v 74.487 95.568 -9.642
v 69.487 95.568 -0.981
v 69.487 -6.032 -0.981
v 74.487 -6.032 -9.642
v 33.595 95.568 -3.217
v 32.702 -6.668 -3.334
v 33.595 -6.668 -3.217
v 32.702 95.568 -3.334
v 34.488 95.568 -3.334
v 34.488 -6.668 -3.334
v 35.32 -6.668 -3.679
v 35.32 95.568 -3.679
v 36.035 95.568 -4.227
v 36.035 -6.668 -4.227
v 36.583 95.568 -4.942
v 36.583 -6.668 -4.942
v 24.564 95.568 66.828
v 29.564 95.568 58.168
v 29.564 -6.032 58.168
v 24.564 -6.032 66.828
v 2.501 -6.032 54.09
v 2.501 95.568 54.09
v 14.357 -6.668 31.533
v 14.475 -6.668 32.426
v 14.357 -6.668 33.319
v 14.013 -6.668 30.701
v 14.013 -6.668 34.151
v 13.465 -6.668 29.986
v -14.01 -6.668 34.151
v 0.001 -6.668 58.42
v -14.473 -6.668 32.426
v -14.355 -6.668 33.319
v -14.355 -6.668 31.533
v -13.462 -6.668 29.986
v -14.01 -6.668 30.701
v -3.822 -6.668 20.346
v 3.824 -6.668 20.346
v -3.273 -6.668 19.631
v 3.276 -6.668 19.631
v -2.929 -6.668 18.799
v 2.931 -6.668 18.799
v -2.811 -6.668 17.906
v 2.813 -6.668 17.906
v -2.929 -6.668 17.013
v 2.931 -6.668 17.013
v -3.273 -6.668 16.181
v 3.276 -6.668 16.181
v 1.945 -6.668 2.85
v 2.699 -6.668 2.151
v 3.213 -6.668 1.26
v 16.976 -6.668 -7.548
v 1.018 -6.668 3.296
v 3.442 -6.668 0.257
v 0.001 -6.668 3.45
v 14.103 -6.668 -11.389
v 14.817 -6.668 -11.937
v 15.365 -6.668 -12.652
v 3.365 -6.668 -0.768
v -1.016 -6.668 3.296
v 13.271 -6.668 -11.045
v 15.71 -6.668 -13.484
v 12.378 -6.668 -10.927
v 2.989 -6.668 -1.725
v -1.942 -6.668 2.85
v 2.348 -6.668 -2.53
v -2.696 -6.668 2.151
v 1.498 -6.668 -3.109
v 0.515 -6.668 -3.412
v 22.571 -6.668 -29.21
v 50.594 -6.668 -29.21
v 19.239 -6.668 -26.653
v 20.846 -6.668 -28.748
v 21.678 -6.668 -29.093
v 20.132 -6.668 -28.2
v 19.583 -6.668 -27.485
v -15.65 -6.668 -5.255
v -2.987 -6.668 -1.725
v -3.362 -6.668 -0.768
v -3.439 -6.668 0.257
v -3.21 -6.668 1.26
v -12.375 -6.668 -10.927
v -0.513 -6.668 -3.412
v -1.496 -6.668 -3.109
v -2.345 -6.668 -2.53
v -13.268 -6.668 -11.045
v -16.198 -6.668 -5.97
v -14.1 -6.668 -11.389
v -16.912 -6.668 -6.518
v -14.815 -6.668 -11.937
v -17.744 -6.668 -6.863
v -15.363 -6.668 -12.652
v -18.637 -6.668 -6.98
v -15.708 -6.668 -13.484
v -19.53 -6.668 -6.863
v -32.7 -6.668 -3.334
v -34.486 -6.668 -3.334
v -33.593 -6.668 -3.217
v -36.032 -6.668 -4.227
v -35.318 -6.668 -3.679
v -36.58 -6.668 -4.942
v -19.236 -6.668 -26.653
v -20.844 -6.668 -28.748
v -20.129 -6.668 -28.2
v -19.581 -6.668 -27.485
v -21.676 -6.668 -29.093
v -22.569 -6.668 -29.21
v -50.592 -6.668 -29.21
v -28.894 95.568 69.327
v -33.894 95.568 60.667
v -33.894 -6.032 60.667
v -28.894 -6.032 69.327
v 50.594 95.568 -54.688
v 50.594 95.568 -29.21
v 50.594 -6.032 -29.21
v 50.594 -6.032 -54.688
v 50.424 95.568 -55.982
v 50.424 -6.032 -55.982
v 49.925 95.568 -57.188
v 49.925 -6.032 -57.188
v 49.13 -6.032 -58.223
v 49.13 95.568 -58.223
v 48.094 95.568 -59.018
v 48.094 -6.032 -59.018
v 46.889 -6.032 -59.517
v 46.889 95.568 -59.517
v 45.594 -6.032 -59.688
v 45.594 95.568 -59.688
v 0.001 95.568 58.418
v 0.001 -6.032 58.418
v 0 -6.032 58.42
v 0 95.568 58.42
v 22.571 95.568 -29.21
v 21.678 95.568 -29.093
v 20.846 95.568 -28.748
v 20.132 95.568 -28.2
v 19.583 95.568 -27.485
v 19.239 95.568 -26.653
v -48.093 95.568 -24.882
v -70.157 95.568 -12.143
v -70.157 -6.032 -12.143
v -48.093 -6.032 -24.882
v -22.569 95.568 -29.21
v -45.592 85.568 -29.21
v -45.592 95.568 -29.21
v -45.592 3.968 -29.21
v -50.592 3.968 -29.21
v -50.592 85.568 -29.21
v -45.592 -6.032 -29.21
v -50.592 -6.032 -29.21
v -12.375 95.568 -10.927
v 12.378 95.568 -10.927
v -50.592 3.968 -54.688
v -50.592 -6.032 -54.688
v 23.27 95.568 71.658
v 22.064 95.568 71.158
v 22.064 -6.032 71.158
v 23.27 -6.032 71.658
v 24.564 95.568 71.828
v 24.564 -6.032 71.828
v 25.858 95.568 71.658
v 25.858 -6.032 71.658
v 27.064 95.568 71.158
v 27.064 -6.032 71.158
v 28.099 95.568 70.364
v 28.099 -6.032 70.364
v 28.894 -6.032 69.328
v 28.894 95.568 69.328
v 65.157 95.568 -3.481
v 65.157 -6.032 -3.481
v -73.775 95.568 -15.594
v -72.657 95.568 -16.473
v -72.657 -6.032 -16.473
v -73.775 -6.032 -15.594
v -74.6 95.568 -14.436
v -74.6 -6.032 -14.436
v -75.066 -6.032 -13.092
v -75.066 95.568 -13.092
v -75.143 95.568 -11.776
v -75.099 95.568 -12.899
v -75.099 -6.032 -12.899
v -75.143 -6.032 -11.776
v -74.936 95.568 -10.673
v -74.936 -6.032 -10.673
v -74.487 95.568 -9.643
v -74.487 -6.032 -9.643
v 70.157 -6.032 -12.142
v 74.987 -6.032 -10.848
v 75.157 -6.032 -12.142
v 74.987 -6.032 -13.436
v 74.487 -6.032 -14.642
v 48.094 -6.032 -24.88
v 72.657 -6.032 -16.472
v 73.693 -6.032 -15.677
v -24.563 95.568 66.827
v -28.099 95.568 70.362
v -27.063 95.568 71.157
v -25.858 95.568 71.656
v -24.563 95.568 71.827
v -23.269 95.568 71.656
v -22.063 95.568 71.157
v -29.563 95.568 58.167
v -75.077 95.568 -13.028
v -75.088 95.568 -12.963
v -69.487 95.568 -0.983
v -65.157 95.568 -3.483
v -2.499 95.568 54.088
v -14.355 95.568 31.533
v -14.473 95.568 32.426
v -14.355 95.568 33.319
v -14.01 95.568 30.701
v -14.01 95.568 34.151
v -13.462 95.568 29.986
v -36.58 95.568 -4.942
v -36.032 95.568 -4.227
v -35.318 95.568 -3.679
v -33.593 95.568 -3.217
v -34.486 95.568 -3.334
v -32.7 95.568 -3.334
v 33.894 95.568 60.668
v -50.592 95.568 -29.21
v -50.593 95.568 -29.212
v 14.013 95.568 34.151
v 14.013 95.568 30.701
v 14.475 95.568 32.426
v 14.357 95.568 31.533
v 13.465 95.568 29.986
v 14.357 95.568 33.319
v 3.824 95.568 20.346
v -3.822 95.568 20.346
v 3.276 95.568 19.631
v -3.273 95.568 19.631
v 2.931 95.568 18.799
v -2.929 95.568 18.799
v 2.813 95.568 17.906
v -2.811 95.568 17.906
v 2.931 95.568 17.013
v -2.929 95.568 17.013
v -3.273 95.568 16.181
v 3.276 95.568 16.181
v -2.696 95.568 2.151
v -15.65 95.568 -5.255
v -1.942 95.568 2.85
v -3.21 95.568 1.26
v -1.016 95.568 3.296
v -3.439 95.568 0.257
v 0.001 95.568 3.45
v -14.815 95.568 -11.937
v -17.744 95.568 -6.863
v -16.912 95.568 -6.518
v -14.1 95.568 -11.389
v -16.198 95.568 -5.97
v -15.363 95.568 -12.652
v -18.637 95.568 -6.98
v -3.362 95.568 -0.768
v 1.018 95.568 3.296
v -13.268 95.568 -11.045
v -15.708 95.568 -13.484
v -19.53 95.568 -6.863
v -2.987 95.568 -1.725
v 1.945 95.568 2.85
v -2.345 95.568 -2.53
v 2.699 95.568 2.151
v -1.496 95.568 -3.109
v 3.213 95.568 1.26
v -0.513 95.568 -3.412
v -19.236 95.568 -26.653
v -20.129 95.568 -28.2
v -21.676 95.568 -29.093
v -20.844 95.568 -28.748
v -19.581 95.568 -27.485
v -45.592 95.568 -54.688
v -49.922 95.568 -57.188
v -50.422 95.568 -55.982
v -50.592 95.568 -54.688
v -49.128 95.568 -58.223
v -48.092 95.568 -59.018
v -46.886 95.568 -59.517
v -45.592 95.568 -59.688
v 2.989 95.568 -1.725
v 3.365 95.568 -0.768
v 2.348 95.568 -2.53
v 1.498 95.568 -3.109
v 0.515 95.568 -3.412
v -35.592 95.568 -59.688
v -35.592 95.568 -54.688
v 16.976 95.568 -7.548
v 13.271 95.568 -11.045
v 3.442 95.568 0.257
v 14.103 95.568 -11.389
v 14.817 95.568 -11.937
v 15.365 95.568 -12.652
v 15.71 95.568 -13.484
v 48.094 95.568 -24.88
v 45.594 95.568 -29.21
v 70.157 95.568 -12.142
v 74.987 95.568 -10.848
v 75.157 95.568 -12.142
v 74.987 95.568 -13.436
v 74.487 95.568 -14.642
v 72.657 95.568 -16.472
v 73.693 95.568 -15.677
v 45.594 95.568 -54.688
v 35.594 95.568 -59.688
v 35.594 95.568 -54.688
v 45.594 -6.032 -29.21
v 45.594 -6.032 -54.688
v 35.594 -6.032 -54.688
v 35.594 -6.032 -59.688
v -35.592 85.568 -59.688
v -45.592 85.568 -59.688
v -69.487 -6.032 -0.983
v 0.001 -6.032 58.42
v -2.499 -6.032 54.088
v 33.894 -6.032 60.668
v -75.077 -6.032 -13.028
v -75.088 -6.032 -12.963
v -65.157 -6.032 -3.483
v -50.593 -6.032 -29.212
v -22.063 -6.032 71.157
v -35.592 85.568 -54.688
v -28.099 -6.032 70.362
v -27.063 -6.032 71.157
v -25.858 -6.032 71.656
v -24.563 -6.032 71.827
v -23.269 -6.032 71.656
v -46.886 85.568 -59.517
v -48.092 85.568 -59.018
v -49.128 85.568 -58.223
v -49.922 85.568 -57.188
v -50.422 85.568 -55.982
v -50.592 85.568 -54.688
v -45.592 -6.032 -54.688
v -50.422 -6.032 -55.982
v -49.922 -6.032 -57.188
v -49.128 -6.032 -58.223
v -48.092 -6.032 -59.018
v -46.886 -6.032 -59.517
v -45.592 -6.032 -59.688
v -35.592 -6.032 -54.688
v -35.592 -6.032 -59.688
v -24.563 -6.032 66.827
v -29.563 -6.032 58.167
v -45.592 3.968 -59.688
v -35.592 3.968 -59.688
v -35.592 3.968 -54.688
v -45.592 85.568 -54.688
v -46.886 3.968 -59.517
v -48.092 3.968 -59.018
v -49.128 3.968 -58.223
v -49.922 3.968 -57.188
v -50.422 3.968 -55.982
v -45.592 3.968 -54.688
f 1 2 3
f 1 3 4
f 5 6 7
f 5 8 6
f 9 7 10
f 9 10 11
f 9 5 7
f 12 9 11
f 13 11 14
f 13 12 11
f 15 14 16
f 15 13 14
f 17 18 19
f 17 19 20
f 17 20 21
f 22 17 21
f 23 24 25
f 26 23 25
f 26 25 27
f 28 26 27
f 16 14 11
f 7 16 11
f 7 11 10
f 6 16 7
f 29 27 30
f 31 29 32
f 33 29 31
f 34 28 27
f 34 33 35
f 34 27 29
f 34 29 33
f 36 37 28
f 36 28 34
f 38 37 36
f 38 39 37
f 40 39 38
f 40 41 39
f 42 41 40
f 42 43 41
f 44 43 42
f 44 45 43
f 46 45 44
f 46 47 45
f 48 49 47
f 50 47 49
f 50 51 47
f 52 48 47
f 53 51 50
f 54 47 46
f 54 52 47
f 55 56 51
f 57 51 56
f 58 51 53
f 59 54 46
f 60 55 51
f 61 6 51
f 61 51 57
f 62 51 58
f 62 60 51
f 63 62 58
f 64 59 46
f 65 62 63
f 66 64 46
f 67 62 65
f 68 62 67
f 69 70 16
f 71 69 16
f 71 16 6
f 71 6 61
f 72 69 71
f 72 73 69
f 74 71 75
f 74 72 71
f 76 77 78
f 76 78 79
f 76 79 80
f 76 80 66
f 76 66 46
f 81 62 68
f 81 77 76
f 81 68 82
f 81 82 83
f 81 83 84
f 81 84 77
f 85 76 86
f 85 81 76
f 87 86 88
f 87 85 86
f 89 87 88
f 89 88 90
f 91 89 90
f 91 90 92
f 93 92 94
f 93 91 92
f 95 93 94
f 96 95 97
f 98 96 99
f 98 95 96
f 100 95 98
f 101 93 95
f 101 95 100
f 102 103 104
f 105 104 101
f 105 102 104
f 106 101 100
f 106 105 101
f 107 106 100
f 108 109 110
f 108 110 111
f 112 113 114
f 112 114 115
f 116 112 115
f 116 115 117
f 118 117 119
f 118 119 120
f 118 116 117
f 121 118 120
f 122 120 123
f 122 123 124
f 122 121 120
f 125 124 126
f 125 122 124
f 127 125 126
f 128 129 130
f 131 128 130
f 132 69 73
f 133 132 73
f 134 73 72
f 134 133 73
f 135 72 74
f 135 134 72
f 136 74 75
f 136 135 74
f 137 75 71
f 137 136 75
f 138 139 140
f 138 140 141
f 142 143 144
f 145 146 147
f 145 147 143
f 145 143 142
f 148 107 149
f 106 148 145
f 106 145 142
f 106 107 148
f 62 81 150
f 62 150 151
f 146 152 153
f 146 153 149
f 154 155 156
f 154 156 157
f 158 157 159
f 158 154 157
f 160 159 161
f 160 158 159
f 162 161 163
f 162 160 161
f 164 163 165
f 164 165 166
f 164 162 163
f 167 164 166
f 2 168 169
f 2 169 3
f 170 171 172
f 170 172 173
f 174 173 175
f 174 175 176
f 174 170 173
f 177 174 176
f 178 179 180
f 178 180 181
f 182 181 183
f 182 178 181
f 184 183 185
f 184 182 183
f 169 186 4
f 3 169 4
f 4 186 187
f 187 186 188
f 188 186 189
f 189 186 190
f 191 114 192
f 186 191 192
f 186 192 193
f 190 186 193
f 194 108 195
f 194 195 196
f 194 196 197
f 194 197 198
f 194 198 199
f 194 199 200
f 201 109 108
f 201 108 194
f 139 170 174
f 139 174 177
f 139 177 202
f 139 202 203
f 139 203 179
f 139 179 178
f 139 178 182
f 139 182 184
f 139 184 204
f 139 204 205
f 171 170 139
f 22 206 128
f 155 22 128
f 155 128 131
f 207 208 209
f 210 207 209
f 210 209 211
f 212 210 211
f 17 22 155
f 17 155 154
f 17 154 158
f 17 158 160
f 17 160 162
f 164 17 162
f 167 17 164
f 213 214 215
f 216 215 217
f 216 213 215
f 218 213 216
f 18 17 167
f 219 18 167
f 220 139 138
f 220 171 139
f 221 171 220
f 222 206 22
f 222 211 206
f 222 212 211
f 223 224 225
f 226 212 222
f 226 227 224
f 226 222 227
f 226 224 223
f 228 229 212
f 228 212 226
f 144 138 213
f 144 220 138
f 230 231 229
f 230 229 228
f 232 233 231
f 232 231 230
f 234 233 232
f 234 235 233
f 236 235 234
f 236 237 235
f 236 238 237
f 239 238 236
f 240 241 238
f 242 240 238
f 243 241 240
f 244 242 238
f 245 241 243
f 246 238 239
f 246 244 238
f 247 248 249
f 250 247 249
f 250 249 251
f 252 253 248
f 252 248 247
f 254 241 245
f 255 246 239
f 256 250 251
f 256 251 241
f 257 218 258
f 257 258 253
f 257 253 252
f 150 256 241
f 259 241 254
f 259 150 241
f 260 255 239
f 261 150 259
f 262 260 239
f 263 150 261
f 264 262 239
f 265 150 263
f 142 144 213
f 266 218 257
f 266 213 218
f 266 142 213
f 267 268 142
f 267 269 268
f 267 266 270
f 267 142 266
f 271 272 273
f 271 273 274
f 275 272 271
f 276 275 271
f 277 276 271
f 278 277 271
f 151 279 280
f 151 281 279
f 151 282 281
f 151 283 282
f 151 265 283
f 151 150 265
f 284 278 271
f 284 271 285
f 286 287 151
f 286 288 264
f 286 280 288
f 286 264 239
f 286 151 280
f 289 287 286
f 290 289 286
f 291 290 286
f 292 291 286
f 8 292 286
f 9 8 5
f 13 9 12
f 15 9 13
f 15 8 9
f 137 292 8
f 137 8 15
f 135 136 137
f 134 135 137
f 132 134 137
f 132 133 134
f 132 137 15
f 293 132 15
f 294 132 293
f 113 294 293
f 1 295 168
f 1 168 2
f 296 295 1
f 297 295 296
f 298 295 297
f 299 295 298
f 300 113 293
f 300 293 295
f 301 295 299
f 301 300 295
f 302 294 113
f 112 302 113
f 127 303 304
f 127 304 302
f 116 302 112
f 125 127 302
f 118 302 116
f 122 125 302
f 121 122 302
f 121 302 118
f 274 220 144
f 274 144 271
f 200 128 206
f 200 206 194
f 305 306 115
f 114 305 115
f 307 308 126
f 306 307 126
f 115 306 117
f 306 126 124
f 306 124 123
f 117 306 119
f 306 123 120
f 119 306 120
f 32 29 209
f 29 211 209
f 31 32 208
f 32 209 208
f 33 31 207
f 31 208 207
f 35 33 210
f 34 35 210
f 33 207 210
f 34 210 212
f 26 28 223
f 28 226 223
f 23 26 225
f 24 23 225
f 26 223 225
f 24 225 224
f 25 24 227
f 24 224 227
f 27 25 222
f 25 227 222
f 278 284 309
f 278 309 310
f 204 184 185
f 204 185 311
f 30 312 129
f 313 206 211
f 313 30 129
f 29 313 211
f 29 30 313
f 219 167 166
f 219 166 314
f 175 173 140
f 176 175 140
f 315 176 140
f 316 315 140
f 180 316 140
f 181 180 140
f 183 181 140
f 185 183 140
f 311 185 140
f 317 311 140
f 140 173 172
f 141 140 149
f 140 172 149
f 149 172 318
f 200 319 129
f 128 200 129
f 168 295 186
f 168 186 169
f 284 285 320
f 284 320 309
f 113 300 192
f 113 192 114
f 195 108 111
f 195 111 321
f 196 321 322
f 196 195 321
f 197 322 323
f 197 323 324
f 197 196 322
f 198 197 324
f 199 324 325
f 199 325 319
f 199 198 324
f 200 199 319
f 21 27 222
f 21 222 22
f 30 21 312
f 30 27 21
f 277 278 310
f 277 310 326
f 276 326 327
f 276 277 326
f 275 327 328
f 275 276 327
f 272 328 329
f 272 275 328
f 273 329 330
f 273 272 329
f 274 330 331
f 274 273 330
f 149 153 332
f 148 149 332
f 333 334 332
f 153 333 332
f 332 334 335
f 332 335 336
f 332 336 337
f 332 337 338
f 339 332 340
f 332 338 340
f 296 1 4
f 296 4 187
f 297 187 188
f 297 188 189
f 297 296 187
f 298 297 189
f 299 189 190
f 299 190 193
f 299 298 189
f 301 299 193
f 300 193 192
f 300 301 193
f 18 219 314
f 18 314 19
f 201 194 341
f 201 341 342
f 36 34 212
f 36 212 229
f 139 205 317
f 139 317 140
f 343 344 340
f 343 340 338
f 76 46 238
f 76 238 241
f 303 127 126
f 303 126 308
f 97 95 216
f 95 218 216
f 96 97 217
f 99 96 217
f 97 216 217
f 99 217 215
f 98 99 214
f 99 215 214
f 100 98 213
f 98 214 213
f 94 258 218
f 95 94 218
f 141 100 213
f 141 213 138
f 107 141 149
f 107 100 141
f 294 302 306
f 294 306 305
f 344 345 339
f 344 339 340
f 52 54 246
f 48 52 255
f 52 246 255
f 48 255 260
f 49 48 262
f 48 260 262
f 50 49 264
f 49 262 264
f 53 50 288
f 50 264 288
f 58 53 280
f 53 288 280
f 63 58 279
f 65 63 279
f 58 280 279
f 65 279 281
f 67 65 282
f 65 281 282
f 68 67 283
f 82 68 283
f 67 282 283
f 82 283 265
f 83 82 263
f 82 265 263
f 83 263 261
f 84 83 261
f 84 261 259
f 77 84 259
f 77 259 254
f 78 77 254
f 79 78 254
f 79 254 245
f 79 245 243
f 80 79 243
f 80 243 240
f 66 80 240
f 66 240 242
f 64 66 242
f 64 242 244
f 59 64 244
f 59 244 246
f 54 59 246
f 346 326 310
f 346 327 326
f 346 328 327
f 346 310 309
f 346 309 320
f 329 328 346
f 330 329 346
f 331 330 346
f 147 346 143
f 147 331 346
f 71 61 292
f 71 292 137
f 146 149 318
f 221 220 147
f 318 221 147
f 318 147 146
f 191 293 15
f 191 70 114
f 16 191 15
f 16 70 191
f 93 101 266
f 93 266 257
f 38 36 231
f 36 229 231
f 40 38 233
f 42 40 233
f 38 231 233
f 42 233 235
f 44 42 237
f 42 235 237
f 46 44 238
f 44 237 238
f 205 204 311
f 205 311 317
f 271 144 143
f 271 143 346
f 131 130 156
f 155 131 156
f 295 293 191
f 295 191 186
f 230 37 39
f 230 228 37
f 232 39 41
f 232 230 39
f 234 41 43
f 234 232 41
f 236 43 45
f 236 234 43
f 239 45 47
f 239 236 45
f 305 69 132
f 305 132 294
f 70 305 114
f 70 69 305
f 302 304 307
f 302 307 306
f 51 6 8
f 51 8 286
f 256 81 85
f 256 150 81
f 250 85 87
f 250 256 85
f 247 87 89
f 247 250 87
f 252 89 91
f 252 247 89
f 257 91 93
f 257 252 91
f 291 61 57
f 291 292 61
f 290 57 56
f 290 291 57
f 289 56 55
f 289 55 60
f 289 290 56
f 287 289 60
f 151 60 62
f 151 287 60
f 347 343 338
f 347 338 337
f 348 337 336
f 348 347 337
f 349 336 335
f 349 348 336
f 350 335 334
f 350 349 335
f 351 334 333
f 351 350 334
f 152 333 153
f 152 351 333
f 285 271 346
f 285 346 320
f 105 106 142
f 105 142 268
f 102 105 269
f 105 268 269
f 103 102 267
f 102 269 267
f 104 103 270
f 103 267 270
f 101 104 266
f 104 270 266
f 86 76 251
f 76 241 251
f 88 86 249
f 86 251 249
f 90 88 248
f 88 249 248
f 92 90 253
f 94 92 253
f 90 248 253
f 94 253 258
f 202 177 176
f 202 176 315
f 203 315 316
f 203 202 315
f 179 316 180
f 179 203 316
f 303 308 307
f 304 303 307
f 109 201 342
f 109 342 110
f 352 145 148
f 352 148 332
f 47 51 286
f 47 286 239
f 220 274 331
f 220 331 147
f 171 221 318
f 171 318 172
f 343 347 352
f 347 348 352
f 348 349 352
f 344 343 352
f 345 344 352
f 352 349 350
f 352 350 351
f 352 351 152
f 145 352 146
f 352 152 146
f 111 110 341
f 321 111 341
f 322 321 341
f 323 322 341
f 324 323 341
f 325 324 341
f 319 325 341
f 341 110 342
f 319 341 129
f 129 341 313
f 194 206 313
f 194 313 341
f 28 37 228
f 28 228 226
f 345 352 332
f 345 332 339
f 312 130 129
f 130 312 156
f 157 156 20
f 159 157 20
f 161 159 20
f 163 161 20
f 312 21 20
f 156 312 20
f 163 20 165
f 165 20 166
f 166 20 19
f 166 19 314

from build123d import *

# Parameters (mm, degrees)
SALIENTE_EXTRUIR1_DEPTH = 88.9
CROQUIS4_R              = 2.999994
CORTAR_EXTRUIR1_DEPTH   = 112.44204772
REDONDEO6_R             = 3
REDONDEO7_R             = 3
ESCALA2_SCALE           = 1.15
SALIENTE_EXTRUIR3_DEPTH = 101.6
CROQUIS10_W             = 32
CROQUIS10_H             = 81.6
CORTAR_EXTRUIR2_DEPTH   = 15


with BuildPart() as part:
    # Croquis1 → Saliente-Extruir1 (new body)
    with BuildSketch(Plane(origin=(0, 0, 0), x_dir=(1, 0, 0), z_dir=(0, 1, 0))):
        Polygon((1.696358741, -16.064461222), (13.335, -27.703102481), (0, -50.8), (-13.335, -27.703102481), (-1.696358741, -16.064461222), (-14.760410887, 6.563140847), (-30.659090512, 2.303102481), (-43.994090512, 25.4), (-17.324090512, 25.4), (-13.064052146, 9.501320374), (13.064052146, 9.501320374), (17.324090512, 25.4), (43.994090512, 25.4), (30.659090512, 2.303102481), (14.760410887, 6.563140847), align=None)
    extrude(amount=SALIENTE_EXTRUIR1_DEPTH)

    # Croquis4 → Cortar-Extruir1 (cut, through all)
    with BuildSketch(Plane(origin=(0, 88.9, 0), x_dir=(1, 0, 0), z_dir=(0, 1, 0))):
        with Locations(Location((0, 0, 0), (0, 0, 270))):
            Circle(CROQUIS4_R)
    extrude(amount=-CORTAR_EXTRUIR1_DEPTH, mode=Mode.SUBTRACT)

    # Redondeo6
    redondeo6_edges = [part.edges().sort_by_distance(p)[0] for p in [
        (-1.696358741, 44.45, 16.064461222),
        (-14.760410887, 44.45, -6.563140847),
        (-13.064052146, 44.45, -9.501320374),
        (13.064052146, 44.45, -9.501320374),
        (1.696358741, 44.45, 16.064461222),
    ]]
    fillet(redondeo6_edges, radius=REDONDEO6_R)

    # Redondeo7
    redondeo7_edges = [part.edges().sort_by_distance(p)[0] for p in [
        (-13.335, 44.45, 27.703102481),
        (-30.659090512, 44.45, -2.303102481),
        (-17.324090512, 44.45, -25.4),
        (17.324090512, 44.45, -25.4),
        (30.659090512, 44.45, -2.303102481),
        (13.335, 44.45, 27.703102481),
    ]]
    fillet(redondeo7_edges, radius=REDONDEO7_R)


with BuildPart() as part_1:
    # Escala2: scaled about (-0.008124988, 44.45, 0.003254237)
    add(part.part.scale(ESCALA2_SCALE).moved(Location((0.001218748, -6.6675, -0.000488136))))

    # Croquis8 → Saliente-Extruir3 (add)
    with BuildSketch(Plane(origin=(0, 95.5675, 0), x_dir=(1, 0, 0), z_dir=(0, 1, 0))):
        with BuildLine():
            Line((-50.591985341, 54.687778623), (-50.591985341, 29.210488136))
            Line((-50.591985341, 29.210488136), (-45.591985341, 29.210488136))
            Line((-45.591985341, 29.210488136), (-45.591985341, 54.687778623))
            Line((-45.591985341, 54.687778623), (-35.591985341, 54.687778623))
            Line((-35.591985341, 54.687778623), (-35.591985341, 59.687778623))
            Line((-35.591985341, 59.687778623), (-45.591985341, 59.687778623))
            ThreePointArc((-45.591985341, 59.687778623), (-49.127519247, 58.223312529), (-50.591985341, 54.687778623))
        make_face()
        with BuildLine():
            Line((-48.092688033, 24.881578215), (-50.591985341, 29.210488136))
            Line((-50.591985341, 29.210488136), (-50.592688033, 29.211705234))
            Line((-50.592688033, 29.211705234), (-72.656668815, 16.47305999))
            ThreePointArc((-72.656668815, 16.47305999), (-74.228672243, 15.044447763), (-75.065739696, 13.092155328))
            ThreePointArc((-75.065739696, 13.092155328), (-75.082537721, 12.995468496), (-75.099211211, 12.89876011))
            ThreePointArc((-75.099211211, 12.89876011), (-75.070496458, 11.218650606), (-74.486795834, 9.642932971))
            Line((-74.486795834, 9.642932971), (-69.486795834, 0.982678934))
            Line((-69.486795834, 0.982678934), (-65.156668815, 3.482678934))
            Line((-65.156668815, 3.482678934), (-70.156668815, 12.142932971))
            Line((-70.156668815, 12.142932971), (-48.092688033, 24.881578215))
        make_face()
        with BuildLine():
            Line((72.656998235, 16.471842892), (50.593017453, 29.210488136))
            Line((50.593017453, 29.210488136), (48.093017453, 24.880361117))
            Line((48.093017453, 24.880361117), (70.156998235, 12.141715873))
            Line((70.156998235, 12.141715873), (65.156998235, 3.481461835))
            Line((65.156998235, 3.481461835), (69.487125254, 0.981461835))
            Line((69.487125254, 0.981461835), (74.487125254, 9.641715873))
            ThreePointArc((74.487125254, 9.641715873), (74.986627366, 13.435811098), (72.656998235, 16.471842892))
        make_face()
        with BuildLine():
            ThreePointArc((50.594422837, 54.687778623), (49.129956743, 58.223312529), (45.594422837, 59.687778623))
            Line((45.594422837, 59.687778623), (35.594422837, 59.687778623))
            Line((35.594422837, 59.687778623), (35.594422837, 54.687778623))
            Line((35.594422837, 54.687778623), (45.594422837, 54.687778623))
            Line((45.594422837, 54.687778623), (45.594422837, 29.210488136))
            Line((45.594422837, 29.210488136), (50.593017453, 29.210488136))
            Line((50.593017453, 29.210488136), (50.594422837, 29.210488136))
            Line((50.594422837, 29.210488136), (50.594422837, 54.687778623))
        make_face()
        with BuildLine():
            Line((2.499813364, -54.089384846), (0.000516056, -58.418294766))
            Line((0.000516056, -58.418294766), (-0.000186636, -58.419511864))
            Line((-0.000186636, -58.419511864), (22.063794146, -71.158157108))
            ThreePointArc((22.063794146, -71.158157108), (25.857889371, -71.657659221), (28.893921165, -69.328030089))
            Line((28.893921165, -69.328030089), (33.893921165, -60.667776052))
            Line((33.893921165, -60.667776052), (29.563794146, -58.167776052))
            Line((29.563794146, -58.167776052), (24.563794146, -66.828030089))
            Line((24.563794146, -66.828030089), (2.499813364, -54.089384846))
        make_face()
        with BuildLine():
            Line((-22.063464726, -71.15694001), (0.000516056, -58.418294766))
            Line((0.000516056, -58.418294766), (-2.499483944, -54.088167747))
            Line((-2.499483944, -54.088167747), (-24.563464726, -66.826812991))
            Line((-24.563464726, -66.826812991), (-29.563464726, -58.166558953))
            Line((-29.563464726, -58.166558953), (-33.893591745, -60.666558953))
            Line((-33.893591745, -60.666558953), (-28.893591745, -69.326812991))
            ThreePointArc((-28.893591745, -69.326812991), (-25.857559952, -71.656442122), (-22.063464726, -71.15694001))
        make_face()
    extrude(amount=-SALIENTE_EXTRUIR3_DEPTH)

    # Croquis10 → Cortar-Extruir2 (cut)
    with BuildSketch(Plane.ZY.offset(50.591985341)):
        with Locations((-45.210488136, 44.7675)):
            Rectangle(CROQUIS10_W, CROQUIS10_H)
    extrude(amount=-CORTAR_EXTRUIR2_DEPTH, mode=Mode.SUBTRACT)


solid = part_1.part
